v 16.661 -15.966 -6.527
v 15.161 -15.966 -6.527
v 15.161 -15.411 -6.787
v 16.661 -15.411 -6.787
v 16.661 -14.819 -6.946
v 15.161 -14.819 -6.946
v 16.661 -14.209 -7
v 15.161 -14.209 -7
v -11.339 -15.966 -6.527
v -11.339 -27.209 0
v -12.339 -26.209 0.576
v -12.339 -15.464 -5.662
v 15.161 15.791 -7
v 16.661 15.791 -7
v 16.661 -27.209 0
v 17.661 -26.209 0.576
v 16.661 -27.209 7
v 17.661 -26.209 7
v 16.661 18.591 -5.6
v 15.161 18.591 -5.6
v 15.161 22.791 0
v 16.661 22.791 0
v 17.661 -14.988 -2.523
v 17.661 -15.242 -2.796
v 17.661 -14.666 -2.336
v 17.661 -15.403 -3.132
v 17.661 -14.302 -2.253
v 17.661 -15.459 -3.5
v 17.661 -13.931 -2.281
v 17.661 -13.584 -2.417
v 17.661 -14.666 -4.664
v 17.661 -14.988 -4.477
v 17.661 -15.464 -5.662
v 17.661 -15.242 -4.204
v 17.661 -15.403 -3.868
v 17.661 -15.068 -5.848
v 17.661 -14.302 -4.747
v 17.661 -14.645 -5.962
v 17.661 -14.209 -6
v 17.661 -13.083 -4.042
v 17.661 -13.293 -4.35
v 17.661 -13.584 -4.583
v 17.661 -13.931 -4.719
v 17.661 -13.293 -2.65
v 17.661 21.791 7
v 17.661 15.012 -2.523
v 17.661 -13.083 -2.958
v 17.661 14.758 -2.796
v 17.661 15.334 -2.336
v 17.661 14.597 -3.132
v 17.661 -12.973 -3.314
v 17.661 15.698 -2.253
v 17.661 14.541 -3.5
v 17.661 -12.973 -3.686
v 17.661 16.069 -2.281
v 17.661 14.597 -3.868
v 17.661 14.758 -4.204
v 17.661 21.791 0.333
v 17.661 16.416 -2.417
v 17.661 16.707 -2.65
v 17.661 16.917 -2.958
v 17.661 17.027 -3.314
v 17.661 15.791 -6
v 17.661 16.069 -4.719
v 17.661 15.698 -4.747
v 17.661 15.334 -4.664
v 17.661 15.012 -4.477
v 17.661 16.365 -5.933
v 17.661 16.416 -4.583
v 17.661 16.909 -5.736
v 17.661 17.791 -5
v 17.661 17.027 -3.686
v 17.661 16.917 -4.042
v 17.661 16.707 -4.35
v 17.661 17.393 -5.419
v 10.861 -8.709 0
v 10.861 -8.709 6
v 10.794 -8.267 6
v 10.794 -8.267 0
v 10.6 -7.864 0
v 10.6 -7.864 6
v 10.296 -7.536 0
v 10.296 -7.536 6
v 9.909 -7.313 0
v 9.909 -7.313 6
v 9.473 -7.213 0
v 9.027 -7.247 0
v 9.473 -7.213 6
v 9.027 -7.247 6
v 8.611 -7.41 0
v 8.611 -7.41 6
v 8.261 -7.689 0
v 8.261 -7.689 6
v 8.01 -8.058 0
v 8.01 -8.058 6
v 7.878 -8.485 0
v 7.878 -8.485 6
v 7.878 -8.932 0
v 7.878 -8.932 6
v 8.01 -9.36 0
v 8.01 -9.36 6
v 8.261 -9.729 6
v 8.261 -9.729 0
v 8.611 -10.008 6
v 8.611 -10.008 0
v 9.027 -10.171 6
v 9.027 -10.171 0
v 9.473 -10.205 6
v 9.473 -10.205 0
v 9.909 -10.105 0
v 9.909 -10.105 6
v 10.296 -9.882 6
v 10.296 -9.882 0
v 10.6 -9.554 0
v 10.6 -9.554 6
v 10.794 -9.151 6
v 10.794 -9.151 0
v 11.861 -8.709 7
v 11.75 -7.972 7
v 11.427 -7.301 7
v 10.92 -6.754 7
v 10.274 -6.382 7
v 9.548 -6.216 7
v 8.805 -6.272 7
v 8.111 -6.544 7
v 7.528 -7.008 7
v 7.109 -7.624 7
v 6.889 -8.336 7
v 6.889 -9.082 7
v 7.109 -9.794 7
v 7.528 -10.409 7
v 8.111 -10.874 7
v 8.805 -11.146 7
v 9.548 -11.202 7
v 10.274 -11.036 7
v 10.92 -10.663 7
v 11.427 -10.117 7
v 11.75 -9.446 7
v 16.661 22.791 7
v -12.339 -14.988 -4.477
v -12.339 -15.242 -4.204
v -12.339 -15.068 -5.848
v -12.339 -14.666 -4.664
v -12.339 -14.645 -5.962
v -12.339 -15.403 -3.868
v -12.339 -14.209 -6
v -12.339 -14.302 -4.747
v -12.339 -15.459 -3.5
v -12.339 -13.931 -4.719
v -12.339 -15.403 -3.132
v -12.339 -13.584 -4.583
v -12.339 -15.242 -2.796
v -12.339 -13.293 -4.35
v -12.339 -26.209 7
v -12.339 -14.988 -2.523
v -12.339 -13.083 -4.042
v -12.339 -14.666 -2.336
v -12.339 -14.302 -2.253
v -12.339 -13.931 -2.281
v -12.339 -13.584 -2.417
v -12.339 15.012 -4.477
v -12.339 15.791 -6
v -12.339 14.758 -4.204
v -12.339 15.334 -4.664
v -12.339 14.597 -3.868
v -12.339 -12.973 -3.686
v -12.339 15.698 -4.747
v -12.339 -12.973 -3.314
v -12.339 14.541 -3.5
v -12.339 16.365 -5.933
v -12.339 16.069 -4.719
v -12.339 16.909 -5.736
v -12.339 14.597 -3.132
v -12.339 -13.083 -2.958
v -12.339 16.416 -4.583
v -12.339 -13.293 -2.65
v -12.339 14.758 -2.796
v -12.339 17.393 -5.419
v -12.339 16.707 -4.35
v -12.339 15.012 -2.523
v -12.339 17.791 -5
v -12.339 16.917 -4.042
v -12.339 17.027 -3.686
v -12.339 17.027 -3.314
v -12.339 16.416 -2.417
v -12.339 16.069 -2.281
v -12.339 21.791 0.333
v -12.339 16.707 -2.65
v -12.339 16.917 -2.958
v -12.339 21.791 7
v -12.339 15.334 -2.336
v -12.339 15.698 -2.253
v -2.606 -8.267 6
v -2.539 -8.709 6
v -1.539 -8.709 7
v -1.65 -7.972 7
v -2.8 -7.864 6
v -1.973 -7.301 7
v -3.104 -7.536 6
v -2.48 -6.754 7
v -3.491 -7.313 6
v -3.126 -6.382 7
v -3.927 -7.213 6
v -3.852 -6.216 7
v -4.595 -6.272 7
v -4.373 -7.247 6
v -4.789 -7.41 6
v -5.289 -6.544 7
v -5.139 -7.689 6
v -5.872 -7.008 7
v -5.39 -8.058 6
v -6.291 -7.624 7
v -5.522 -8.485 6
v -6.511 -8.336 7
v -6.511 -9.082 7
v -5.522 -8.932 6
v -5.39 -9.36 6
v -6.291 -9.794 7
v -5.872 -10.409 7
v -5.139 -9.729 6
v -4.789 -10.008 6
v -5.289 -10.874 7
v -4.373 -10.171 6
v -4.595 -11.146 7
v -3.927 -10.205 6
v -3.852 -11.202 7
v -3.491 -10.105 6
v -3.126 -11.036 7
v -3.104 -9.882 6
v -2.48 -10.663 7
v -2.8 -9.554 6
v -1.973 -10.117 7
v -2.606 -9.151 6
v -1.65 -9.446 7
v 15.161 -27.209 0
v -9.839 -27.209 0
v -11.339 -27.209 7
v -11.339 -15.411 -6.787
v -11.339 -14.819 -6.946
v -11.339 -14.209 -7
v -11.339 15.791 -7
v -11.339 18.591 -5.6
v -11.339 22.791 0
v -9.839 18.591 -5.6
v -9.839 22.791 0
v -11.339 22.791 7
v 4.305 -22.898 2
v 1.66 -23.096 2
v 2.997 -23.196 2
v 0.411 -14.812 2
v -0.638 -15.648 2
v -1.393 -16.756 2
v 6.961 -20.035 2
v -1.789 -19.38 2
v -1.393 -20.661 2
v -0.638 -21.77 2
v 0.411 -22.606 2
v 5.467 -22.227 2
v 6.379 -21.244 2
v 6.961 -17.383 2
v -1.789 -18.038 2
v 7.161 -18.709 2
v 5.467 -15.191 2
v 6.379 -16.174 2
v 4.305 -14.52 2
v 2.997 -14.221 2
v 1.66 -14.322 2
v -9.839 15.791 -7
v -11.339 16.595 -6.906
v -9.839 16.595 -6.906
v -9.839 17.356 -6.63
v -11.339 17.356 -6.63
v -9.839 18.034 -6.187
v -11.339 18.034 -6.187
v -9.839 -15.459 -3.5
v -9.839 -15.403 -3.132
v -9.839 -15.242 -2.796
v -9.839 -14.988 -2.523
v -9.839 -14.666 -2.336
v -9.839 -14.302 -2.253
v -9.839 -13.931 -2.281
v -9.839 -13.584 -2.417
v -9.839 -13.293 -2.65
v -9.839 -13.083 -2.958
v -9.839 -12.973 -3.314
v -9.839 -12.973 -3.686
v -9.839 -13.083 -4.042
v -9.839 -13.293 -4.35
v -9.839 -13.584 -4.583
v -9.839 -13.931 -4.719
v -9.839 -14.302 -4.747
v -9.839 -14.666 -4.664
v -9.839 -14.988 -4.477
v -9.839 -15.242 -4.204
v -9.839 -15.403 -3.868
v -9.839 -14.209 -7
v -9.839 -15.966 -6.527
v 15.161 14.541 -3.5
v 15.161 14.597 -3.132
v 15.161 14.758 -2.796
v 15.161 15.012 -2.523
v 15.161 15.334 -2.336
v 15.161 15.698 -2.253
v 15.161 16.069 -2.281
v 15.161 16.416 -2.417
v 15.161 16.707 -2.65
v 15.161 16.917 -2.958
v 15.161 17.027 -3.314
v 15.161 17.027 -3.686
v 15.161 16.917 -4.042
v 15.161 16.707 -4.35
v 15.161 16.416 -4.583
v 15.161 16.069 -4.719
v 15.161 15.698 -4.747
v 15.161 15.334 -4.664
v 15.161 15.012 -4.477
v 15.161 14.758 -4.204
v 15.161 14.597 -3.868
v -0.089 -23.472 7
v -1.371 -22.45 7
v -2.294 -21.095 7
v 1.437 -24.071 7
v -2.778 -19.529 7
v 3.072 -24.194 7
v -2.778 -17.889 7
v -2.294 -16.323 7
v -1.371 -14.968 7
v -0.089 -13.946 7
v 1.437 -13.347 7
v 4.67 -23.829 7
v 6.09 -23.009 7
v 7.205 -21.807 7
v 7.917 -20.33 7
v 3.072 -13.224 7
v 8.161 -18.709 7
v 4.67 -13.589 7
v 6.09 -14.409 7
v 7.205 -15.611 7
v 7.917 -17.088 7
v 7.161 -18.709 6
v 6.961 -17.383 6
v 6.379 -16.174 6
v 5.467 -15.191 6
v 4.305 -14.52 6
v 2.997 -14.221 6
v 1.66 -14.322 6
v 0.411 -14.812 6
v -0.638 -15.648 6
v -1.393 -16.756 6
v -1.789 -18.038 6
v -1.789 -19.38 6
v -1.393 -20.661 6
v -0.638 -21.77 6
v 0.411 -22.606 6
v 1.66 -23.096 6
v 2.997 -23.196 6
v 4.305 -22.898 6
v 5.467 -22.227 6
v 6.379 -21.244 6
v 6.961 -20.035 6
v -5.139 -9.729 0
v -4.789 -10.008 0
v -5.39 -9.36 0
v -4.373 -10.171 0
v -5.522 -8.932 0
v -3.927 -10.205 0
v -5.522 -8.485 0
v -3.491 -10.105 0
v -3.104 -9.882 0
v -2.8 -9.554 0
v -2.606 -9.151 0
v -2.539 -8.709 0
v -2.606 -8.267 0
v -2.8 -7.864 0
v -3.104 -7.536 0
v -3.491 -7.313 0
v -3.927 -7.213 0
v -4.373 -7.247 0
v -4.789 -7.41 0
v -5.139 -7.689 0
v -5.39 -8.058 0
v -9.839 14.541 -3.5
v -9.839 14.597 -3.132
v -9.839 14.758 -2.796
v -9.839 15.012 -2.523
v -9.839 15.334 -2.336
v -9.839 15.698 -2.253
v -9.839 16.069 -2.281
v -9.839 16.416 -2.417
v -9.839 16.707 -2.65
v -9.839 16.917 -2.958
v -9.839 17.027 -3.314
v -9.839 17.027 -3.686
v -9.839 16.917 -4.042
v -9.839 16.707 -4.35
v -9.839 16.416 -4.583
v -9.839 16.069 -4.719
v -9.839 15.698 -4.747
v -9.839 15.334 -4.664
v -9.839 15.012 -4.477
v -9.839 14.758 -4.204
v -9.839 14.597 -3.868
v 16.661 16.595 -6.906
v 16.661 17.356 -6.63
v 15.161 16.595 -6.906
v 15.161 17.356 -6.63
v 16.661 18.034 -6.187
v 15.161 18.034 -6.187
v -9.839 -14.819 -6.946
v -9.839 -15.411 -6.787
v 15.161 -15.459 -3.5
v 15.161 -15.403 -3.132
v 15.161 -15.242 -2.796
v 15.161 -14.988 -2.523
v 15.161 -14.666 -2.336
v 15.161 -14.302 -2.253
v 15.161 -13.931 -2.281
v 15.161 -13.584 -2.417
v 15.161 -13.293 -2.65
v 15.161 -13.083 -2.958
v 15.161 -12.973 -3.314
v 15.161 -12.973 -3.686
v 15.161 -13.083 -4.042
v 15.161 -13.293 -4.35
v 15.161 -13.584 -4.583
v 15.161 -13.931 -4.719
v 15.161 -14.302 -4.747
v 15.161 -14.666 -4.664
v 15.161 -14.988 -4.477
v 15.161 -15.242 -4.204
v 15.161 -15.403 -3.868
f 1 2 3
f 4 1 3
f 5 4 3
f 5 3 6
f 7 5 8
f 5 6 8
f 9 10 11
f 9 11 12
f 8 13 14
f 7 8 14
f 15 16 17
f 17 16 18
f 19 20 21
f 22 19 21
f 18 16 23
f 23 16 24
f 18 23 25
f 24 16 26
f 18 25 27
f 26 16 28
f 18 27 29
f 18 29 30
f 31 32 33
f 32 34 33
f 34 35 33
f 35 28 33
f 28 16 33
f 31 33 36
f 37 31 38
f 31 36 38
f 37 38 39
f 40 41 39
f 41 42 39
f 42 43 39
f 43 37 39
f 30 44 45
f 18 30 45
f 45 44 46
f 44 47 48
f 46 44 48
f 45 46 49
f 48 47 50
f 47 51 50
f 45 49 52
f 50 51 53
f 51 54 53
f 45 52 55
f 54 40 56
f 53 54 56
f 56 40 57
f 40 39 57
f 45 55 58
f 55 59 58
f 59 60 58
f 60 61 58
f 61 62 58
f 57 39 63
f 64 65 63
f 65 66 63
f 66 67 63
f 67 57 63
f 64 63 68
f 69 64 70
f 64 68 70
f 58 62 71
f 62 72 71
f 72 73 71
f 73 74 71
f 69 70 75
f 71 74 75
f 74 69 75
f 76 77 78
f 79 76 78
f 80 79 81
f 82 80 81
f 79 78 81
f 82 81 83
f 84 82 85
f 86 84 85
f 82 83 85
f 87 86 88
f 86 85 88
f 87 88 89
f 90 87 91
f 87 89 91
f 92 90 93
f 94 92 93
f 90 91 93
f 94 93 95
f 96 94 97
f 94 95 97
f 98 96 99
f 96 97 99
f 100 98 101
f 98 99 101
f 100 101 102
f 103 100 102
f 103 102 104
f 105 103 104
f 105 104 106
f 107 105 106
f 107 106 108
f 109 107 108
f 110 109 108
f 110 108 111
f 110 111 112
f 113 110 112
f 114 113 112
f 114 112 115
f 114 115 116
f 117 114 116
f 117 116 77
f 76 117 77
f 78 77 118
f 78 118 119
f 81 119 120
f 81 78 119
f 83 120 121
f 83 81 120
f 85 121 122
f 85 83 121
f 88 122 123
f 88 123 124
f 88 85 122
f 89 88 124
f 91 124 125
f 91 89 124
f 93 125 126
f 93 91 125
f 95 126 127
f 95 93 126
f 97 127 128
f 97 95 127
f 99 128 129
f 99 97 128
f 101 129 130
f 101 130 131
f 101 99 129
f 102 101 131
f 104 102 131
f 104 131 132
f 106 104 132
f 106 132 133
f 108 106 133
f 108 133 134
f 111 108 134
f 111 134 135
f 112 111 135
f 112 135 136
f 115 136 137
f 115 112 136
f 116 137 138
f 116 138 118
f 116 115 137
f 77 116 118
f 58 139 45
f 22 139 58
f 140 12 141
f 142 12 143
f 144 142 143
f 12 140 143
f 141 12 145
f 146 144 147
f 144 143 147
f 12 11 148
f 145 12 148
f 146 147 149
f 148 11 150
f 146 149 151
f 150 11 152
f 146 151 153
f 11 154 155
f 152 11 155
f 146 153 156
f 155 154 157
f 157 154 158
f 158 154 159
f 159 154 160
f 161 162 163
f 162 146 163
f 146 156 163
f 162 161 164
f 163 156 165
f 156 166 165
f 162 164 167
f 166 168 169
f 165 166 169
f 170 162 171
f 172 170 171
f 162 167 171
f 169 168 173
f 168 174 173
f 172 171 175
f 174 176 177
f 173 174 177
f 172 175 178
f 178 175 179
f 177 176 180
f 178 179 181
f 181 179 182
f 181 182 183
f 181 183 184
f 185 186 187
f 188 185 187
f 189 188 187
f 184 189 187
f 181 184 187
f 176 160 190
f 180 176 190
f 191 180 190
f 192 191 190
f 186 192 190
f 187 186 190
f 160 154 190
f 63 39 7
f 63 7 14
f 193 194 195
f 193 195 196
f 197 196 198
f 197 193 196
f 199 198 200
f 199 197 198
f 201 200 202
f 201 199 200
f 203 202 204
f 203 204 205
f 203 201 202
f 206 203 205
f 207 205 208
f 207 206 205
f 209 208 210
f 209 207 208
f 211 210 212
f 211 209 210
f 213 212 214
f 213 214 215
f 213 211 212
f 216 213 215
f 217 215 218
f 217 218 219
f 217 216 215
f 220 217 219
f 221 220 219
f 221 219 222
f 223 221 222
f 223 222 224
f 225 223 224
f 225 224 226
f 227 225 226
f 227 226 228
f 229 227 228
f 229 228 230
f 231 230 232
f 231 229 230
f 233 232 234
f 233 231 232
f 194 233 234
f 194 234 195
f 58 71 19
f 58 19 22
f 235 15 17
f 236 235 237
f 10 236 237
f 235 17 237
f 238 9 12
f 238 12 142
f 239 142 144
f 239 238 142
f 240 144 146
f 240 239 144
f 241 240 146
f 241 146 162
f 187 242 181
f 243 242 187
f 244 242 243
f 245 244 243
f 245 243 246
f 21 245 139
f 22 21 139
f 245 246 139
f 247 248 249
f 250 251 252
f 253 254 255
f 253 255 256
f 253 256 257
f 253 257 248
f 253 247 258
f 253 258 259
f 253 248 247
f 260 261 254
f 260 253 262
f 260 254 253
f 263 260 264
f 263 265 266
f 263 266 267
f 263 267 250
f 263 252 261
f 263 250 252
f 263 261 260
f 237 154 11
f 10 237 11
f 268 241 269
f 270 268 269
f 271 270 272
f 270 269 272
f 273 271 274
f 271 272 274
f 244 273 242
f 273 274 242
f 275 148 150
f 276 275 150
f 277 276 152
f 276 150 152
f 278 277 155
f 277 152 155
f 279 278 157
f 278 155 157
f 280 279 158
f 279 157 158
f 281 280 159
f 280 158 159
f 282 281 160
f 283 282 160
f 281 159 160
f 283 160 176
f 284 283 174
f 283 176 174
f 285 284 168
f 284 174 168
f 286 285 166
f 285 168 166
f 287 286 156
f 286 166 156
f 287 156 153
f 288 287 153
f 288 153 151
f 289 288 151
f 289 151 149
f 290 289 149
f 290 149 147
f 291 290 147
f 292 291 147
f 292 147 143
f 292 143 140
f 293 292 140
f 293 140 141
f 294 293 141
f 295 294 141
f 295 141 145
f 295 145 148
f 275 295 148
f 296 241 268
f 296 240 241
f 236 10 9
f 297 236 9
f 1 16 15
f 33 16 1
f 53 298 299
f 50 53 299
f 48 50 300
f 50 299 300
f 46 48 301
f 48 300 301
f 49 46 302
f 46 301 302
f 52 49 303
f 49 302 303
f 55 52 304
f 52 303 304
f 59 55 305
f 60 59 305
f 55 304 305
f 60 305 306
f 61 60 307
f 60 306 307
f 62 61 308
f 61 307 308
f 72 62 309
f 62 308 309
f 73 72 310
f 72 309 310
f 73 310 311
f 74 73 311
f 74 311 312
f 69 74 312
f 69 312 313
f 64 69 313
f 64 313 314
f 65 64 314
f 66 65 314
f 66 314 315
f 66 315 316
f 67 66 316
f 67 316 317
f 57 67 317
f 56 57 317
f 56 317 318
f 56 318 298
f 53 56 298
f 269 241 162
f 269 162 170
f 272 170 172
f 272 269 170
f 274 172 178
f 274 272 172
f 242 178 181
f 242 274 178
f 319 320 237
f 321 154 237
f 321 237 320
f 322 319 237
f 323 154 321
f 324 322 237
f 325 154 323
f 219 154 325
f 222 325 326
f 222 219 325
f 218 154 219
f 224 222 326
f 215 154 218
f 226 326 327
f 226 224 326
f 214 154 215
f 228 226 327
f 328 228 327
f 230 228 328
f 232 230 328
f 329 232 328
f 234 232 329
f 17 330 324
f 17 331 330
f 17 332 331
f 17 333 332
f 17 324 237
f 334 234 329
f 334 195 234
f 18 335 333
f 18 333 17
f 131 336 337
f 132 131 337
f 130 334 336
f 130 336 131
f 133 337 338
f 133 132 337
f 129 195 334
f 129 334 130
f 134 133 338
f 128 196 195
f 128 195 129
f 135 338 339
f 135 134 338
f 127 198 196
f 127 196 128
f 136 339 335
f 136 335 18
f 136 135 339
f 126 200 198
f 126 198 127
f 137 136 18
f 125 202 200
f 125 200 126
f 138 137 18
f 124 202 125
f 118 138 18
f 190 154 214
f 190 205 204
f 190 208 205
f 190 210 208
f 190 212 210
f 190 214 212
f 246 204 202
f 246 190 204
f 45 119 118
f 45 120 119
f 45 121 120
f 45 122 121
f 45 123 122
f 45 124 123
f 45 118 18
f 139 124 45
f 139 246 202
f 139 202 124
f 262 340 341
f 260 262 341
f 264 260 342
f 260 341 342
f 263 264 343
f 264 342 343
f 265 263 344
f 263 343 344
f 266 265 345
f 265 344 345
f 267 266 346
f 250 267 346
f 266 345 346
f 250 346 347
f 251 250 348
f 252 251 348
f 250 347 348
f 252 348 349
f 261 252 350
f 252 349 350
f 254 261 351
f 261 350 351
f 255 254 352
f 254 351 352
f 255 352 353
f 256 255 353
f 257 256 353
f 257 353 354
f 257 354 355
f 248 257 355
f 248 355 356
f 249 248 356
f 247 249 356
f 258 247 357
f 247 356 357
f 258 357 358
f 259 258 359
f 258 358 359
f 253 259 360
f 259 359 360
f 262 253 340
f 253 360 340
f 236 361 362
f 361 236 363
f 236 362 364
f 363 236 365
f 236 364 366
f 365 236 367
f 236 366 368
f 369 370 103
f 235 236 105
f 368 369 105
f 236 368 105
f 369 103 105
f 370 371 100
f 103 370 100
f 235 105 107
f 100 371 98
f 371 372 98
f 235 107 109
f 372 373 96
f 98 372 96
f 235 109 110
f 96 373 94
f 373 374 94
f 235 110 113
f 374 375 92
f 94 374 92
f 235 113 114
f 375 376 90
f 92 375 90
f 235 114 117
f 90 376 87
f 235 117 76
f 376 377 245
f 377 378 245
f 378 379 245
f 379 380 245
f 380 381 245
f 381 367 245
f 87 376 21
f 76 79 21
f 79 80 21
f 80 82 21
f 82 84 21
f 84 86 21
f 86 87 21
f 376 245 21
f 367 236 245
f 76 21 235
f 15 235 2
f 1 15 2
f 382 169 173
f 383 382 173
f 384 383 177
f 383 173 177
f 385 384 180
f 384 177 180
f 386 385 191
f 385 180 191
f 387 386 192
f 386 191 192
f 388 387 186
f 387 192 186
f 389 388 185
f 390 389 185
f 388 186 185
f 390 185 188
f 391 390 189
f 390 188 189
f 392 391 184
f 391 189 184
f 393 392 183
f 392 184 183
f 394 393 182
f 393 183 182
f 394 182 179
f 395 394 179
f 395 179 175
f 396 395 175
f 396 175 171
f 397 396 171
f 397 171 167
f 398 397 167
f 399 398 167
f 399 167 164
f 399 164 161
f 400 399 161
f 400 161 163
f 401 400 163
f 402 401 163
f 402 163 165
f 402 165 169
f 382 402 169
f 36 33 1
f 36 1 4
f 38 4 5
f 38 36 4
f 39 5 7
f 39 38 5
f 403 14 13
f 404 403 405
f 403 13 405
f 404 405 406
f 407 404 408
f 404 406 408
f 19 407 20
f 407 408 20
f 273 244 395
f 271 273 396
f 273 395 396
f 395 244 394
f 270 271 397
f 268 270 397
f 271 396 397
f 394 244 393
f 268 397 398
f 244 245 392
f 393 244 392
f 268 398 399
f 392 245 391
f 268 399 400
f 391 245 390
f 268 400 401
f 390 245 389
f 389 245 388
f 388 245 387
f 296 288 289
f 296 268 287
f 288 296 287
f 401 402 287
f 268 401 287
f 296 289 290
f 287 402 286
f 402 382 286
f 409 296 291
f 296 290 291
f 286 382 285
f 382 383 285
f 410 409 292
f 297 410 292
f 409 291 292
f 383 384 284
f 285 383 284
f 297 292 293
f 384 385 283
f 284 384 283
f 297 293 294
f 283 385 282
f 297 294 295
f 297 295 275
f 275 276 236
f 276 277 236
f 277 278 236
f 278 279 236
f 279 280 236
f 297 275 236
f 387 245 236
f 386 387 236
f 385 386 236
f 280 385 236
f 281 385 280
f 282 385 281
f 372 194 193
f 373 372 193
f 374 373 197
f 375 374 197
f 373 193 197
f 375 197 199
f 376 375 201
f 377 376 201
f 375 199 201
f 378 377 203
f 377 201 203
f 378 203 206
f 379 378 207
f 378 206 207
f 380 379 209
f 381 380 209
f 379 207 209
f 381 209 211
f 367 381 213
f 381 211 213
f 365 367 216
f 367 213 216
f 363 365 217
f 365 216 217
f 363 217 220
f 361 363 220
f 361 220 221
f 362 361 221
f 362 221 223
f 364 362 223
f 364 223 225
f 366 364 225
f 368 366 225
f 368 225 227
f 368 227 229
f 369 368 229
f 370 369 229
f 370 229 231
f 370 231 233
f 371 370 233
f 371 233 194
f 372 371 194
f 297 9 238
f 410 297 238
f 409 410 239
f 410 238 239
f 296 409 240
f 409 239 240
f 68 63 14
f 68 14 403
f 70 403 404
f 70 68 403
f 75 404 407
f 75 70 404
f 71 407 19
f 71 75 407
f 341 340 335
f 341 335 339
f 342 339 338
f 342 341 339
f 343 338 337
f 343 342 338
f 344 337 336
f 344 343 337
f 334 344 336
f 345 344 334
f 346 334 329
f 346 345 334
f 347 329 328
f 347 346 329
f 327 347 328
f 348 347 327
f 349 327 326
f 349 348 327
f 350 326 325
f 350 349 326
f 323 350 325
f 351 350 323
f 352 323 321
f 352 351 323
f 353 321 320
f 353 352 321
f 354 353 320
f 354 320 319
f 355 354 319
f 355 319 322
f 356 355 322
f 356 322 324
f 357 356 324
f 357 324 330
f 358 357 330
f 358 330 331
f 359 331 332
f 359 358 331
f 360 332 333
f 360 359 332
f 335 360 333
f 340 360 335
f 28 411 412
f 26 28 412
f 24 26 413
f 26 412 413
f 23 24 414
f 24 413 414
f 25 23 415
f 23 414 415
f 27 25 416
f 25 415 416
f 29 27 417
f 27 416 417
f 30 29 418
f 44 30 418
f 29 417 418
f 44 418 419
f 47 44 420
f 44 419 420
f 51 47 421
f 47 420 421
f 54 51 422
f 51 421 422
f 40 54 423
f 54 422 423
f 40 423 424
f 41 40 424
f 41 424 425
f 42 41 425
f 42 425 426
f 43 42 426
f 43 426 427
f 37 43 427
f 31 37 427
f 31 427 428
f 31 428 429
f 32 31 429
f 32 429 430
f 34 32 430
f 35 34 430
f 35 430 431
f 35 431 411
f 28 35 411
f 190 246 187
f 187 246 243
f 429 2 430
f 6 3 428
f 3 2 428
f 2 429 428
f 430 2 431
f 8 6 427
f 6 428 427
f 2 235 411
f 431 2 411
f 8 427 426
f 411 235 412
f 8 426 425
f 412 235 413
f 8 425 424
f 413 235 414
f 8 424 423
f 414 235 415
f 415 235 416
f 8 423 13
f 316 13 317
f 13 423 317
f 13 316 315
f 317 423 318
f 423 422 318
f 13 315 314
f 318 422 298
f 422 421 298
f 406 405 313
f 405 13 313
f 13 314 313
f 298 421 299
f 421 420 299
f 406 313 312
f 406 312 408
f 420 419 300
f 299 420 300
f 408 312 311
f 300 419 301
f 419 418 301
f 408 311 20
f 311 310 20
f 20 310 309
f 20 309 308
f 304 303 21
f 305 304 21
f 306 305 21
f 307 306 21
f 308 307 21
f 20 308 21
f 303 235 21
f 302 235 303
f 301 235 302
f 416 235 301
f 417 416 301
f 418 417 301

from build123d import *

# Parameters (mm, degrees)
F0_W     = 30
F0_H     = 50
F1_DEPTH = 7
F2_R     = 4.5
F3_DEPTH = 5
F4_R     = 1.5
F5_DEPTH = 7.001
F7_DEPTH = 7
F8_R     = 1.25
F9_DEPTH = 30.001
F10_SIZE = 1


with BuildPart() as f1:
    # F0 (on Top) → F1 (new body)
    with BuildSketch(Plane.XY):
        with Locations((2.6609585285, -2.2089038044)):
            Rectangle(F0_W, F0_H)
    extrude(amount=F1_DEPTH)

    # F2 (on face) → F3 (cut)
    with BuildSketch(Plane.XY.offset(7)):
        with Locations((2.6609585285, -18.7089038044)):
            Circle(F2_R)
    extrude(amount=-F3_DEPTH, mode=Mode.SUBTRACT)

    # F4 (on face) → F5 (cut, through all)
    with BuildSketch(Plane.XY.offset(7)):
        with Locations((9.3609585285, -8.7089038044)):
            Circle(F4_R)
        with Locations((-4.0390414715, -8.7089038044)):
            Circle(F4_R)
    extrude(amount=-F5_DEPTH, mode=Mode.SUBTRACT)

    # F6 (on face) → F7 (join)
    with BuildSketch(Plane(origin=(0, 0, 0), x_dir=(1, 0, 0), z_dir=(0, 0, -1))):
        Polygon((-9.8390414715, 27.2089038044), (-12.3390414715, 27.2089038044), (-12.3390414715, -22.7910961956), (-9.8390414715, -22.7910961956), (-9.8390414715, -19.8687557131), (-9.8390414715, -19.1495772451), align=None)
        Polygon((17.6609585285, 27.2089038044), (15.1609585285, 27.2089038044), (15.1609585285, -19.1495772451), (15.1609585285, -19.8687557131), (15.1609585285, -22.7910961956), (17.6609585285, -22.7910961956), align=None)
    extrude(amount=F7_DEPTH)

    # F8 (on face) → F9 (cut, through all)
    with BuildSketch(Plane(origin=(-12.3390414715, 0, 0), x_dir=(0, -1, 0), z_dir=(-1, 0, 0))):
        with BuildLine():
            ThreePointArc((-15.7910961956, -7), (-17.3563437798, -6.6304951685), (-18.5910961956, -5.6))
            Line((-18.5910961956, -5.6), (-22.7910961956, 0))
            Line((-22.7910961956, 0), (-22.7910961956, -7))
            Line((-22.7910961956, -7), (-15.7910961956, -7))
        make_face()
        with BuildLine():
            ThreePointArc((15.9661451837, -6.5268965517), (15.1188109615, -6.8796551548), (14.2089038044, -7))
            Line((14.2089038044, -7), (27.2089038044, -7))
            Line((27.2089038044, -7), (27.2089038044, 0))
            Line((27.2089038044, 0), (15.9661451837, -6.5268965517))
        make_face()
        with Locations((14.2089038044, -3.5)):
            Circle(F8_R)
        with Locations((-15.7910961956, -3.5)):
            Circle(F8_R)
    extrude(amount=-F9_DEPTH, mode=Mode.SUBTRACT)

    # F10
    f10_edges = [f1.edges().sort_by_distance(p)[0] for p in [
        (-12.339041, 22.791096, 3.5),
        (-12.339041, 20.691096, -2.8),
        (-12.339041, -27.208904, 3.5),
        (17.660959, -27.208904, 3.5),
        (17.660959, -21.587524, -3.263448),
        (17.660959, 22.791096, 3.5),
        (-1.839041, -18.708904, 7),
        (-5.539041, -8.708904, 7),
        (7.860959, -8.708904, 7),
    ]]
    chamfer(f10_edges, length=F10_SIZE)


solid = f1.part
